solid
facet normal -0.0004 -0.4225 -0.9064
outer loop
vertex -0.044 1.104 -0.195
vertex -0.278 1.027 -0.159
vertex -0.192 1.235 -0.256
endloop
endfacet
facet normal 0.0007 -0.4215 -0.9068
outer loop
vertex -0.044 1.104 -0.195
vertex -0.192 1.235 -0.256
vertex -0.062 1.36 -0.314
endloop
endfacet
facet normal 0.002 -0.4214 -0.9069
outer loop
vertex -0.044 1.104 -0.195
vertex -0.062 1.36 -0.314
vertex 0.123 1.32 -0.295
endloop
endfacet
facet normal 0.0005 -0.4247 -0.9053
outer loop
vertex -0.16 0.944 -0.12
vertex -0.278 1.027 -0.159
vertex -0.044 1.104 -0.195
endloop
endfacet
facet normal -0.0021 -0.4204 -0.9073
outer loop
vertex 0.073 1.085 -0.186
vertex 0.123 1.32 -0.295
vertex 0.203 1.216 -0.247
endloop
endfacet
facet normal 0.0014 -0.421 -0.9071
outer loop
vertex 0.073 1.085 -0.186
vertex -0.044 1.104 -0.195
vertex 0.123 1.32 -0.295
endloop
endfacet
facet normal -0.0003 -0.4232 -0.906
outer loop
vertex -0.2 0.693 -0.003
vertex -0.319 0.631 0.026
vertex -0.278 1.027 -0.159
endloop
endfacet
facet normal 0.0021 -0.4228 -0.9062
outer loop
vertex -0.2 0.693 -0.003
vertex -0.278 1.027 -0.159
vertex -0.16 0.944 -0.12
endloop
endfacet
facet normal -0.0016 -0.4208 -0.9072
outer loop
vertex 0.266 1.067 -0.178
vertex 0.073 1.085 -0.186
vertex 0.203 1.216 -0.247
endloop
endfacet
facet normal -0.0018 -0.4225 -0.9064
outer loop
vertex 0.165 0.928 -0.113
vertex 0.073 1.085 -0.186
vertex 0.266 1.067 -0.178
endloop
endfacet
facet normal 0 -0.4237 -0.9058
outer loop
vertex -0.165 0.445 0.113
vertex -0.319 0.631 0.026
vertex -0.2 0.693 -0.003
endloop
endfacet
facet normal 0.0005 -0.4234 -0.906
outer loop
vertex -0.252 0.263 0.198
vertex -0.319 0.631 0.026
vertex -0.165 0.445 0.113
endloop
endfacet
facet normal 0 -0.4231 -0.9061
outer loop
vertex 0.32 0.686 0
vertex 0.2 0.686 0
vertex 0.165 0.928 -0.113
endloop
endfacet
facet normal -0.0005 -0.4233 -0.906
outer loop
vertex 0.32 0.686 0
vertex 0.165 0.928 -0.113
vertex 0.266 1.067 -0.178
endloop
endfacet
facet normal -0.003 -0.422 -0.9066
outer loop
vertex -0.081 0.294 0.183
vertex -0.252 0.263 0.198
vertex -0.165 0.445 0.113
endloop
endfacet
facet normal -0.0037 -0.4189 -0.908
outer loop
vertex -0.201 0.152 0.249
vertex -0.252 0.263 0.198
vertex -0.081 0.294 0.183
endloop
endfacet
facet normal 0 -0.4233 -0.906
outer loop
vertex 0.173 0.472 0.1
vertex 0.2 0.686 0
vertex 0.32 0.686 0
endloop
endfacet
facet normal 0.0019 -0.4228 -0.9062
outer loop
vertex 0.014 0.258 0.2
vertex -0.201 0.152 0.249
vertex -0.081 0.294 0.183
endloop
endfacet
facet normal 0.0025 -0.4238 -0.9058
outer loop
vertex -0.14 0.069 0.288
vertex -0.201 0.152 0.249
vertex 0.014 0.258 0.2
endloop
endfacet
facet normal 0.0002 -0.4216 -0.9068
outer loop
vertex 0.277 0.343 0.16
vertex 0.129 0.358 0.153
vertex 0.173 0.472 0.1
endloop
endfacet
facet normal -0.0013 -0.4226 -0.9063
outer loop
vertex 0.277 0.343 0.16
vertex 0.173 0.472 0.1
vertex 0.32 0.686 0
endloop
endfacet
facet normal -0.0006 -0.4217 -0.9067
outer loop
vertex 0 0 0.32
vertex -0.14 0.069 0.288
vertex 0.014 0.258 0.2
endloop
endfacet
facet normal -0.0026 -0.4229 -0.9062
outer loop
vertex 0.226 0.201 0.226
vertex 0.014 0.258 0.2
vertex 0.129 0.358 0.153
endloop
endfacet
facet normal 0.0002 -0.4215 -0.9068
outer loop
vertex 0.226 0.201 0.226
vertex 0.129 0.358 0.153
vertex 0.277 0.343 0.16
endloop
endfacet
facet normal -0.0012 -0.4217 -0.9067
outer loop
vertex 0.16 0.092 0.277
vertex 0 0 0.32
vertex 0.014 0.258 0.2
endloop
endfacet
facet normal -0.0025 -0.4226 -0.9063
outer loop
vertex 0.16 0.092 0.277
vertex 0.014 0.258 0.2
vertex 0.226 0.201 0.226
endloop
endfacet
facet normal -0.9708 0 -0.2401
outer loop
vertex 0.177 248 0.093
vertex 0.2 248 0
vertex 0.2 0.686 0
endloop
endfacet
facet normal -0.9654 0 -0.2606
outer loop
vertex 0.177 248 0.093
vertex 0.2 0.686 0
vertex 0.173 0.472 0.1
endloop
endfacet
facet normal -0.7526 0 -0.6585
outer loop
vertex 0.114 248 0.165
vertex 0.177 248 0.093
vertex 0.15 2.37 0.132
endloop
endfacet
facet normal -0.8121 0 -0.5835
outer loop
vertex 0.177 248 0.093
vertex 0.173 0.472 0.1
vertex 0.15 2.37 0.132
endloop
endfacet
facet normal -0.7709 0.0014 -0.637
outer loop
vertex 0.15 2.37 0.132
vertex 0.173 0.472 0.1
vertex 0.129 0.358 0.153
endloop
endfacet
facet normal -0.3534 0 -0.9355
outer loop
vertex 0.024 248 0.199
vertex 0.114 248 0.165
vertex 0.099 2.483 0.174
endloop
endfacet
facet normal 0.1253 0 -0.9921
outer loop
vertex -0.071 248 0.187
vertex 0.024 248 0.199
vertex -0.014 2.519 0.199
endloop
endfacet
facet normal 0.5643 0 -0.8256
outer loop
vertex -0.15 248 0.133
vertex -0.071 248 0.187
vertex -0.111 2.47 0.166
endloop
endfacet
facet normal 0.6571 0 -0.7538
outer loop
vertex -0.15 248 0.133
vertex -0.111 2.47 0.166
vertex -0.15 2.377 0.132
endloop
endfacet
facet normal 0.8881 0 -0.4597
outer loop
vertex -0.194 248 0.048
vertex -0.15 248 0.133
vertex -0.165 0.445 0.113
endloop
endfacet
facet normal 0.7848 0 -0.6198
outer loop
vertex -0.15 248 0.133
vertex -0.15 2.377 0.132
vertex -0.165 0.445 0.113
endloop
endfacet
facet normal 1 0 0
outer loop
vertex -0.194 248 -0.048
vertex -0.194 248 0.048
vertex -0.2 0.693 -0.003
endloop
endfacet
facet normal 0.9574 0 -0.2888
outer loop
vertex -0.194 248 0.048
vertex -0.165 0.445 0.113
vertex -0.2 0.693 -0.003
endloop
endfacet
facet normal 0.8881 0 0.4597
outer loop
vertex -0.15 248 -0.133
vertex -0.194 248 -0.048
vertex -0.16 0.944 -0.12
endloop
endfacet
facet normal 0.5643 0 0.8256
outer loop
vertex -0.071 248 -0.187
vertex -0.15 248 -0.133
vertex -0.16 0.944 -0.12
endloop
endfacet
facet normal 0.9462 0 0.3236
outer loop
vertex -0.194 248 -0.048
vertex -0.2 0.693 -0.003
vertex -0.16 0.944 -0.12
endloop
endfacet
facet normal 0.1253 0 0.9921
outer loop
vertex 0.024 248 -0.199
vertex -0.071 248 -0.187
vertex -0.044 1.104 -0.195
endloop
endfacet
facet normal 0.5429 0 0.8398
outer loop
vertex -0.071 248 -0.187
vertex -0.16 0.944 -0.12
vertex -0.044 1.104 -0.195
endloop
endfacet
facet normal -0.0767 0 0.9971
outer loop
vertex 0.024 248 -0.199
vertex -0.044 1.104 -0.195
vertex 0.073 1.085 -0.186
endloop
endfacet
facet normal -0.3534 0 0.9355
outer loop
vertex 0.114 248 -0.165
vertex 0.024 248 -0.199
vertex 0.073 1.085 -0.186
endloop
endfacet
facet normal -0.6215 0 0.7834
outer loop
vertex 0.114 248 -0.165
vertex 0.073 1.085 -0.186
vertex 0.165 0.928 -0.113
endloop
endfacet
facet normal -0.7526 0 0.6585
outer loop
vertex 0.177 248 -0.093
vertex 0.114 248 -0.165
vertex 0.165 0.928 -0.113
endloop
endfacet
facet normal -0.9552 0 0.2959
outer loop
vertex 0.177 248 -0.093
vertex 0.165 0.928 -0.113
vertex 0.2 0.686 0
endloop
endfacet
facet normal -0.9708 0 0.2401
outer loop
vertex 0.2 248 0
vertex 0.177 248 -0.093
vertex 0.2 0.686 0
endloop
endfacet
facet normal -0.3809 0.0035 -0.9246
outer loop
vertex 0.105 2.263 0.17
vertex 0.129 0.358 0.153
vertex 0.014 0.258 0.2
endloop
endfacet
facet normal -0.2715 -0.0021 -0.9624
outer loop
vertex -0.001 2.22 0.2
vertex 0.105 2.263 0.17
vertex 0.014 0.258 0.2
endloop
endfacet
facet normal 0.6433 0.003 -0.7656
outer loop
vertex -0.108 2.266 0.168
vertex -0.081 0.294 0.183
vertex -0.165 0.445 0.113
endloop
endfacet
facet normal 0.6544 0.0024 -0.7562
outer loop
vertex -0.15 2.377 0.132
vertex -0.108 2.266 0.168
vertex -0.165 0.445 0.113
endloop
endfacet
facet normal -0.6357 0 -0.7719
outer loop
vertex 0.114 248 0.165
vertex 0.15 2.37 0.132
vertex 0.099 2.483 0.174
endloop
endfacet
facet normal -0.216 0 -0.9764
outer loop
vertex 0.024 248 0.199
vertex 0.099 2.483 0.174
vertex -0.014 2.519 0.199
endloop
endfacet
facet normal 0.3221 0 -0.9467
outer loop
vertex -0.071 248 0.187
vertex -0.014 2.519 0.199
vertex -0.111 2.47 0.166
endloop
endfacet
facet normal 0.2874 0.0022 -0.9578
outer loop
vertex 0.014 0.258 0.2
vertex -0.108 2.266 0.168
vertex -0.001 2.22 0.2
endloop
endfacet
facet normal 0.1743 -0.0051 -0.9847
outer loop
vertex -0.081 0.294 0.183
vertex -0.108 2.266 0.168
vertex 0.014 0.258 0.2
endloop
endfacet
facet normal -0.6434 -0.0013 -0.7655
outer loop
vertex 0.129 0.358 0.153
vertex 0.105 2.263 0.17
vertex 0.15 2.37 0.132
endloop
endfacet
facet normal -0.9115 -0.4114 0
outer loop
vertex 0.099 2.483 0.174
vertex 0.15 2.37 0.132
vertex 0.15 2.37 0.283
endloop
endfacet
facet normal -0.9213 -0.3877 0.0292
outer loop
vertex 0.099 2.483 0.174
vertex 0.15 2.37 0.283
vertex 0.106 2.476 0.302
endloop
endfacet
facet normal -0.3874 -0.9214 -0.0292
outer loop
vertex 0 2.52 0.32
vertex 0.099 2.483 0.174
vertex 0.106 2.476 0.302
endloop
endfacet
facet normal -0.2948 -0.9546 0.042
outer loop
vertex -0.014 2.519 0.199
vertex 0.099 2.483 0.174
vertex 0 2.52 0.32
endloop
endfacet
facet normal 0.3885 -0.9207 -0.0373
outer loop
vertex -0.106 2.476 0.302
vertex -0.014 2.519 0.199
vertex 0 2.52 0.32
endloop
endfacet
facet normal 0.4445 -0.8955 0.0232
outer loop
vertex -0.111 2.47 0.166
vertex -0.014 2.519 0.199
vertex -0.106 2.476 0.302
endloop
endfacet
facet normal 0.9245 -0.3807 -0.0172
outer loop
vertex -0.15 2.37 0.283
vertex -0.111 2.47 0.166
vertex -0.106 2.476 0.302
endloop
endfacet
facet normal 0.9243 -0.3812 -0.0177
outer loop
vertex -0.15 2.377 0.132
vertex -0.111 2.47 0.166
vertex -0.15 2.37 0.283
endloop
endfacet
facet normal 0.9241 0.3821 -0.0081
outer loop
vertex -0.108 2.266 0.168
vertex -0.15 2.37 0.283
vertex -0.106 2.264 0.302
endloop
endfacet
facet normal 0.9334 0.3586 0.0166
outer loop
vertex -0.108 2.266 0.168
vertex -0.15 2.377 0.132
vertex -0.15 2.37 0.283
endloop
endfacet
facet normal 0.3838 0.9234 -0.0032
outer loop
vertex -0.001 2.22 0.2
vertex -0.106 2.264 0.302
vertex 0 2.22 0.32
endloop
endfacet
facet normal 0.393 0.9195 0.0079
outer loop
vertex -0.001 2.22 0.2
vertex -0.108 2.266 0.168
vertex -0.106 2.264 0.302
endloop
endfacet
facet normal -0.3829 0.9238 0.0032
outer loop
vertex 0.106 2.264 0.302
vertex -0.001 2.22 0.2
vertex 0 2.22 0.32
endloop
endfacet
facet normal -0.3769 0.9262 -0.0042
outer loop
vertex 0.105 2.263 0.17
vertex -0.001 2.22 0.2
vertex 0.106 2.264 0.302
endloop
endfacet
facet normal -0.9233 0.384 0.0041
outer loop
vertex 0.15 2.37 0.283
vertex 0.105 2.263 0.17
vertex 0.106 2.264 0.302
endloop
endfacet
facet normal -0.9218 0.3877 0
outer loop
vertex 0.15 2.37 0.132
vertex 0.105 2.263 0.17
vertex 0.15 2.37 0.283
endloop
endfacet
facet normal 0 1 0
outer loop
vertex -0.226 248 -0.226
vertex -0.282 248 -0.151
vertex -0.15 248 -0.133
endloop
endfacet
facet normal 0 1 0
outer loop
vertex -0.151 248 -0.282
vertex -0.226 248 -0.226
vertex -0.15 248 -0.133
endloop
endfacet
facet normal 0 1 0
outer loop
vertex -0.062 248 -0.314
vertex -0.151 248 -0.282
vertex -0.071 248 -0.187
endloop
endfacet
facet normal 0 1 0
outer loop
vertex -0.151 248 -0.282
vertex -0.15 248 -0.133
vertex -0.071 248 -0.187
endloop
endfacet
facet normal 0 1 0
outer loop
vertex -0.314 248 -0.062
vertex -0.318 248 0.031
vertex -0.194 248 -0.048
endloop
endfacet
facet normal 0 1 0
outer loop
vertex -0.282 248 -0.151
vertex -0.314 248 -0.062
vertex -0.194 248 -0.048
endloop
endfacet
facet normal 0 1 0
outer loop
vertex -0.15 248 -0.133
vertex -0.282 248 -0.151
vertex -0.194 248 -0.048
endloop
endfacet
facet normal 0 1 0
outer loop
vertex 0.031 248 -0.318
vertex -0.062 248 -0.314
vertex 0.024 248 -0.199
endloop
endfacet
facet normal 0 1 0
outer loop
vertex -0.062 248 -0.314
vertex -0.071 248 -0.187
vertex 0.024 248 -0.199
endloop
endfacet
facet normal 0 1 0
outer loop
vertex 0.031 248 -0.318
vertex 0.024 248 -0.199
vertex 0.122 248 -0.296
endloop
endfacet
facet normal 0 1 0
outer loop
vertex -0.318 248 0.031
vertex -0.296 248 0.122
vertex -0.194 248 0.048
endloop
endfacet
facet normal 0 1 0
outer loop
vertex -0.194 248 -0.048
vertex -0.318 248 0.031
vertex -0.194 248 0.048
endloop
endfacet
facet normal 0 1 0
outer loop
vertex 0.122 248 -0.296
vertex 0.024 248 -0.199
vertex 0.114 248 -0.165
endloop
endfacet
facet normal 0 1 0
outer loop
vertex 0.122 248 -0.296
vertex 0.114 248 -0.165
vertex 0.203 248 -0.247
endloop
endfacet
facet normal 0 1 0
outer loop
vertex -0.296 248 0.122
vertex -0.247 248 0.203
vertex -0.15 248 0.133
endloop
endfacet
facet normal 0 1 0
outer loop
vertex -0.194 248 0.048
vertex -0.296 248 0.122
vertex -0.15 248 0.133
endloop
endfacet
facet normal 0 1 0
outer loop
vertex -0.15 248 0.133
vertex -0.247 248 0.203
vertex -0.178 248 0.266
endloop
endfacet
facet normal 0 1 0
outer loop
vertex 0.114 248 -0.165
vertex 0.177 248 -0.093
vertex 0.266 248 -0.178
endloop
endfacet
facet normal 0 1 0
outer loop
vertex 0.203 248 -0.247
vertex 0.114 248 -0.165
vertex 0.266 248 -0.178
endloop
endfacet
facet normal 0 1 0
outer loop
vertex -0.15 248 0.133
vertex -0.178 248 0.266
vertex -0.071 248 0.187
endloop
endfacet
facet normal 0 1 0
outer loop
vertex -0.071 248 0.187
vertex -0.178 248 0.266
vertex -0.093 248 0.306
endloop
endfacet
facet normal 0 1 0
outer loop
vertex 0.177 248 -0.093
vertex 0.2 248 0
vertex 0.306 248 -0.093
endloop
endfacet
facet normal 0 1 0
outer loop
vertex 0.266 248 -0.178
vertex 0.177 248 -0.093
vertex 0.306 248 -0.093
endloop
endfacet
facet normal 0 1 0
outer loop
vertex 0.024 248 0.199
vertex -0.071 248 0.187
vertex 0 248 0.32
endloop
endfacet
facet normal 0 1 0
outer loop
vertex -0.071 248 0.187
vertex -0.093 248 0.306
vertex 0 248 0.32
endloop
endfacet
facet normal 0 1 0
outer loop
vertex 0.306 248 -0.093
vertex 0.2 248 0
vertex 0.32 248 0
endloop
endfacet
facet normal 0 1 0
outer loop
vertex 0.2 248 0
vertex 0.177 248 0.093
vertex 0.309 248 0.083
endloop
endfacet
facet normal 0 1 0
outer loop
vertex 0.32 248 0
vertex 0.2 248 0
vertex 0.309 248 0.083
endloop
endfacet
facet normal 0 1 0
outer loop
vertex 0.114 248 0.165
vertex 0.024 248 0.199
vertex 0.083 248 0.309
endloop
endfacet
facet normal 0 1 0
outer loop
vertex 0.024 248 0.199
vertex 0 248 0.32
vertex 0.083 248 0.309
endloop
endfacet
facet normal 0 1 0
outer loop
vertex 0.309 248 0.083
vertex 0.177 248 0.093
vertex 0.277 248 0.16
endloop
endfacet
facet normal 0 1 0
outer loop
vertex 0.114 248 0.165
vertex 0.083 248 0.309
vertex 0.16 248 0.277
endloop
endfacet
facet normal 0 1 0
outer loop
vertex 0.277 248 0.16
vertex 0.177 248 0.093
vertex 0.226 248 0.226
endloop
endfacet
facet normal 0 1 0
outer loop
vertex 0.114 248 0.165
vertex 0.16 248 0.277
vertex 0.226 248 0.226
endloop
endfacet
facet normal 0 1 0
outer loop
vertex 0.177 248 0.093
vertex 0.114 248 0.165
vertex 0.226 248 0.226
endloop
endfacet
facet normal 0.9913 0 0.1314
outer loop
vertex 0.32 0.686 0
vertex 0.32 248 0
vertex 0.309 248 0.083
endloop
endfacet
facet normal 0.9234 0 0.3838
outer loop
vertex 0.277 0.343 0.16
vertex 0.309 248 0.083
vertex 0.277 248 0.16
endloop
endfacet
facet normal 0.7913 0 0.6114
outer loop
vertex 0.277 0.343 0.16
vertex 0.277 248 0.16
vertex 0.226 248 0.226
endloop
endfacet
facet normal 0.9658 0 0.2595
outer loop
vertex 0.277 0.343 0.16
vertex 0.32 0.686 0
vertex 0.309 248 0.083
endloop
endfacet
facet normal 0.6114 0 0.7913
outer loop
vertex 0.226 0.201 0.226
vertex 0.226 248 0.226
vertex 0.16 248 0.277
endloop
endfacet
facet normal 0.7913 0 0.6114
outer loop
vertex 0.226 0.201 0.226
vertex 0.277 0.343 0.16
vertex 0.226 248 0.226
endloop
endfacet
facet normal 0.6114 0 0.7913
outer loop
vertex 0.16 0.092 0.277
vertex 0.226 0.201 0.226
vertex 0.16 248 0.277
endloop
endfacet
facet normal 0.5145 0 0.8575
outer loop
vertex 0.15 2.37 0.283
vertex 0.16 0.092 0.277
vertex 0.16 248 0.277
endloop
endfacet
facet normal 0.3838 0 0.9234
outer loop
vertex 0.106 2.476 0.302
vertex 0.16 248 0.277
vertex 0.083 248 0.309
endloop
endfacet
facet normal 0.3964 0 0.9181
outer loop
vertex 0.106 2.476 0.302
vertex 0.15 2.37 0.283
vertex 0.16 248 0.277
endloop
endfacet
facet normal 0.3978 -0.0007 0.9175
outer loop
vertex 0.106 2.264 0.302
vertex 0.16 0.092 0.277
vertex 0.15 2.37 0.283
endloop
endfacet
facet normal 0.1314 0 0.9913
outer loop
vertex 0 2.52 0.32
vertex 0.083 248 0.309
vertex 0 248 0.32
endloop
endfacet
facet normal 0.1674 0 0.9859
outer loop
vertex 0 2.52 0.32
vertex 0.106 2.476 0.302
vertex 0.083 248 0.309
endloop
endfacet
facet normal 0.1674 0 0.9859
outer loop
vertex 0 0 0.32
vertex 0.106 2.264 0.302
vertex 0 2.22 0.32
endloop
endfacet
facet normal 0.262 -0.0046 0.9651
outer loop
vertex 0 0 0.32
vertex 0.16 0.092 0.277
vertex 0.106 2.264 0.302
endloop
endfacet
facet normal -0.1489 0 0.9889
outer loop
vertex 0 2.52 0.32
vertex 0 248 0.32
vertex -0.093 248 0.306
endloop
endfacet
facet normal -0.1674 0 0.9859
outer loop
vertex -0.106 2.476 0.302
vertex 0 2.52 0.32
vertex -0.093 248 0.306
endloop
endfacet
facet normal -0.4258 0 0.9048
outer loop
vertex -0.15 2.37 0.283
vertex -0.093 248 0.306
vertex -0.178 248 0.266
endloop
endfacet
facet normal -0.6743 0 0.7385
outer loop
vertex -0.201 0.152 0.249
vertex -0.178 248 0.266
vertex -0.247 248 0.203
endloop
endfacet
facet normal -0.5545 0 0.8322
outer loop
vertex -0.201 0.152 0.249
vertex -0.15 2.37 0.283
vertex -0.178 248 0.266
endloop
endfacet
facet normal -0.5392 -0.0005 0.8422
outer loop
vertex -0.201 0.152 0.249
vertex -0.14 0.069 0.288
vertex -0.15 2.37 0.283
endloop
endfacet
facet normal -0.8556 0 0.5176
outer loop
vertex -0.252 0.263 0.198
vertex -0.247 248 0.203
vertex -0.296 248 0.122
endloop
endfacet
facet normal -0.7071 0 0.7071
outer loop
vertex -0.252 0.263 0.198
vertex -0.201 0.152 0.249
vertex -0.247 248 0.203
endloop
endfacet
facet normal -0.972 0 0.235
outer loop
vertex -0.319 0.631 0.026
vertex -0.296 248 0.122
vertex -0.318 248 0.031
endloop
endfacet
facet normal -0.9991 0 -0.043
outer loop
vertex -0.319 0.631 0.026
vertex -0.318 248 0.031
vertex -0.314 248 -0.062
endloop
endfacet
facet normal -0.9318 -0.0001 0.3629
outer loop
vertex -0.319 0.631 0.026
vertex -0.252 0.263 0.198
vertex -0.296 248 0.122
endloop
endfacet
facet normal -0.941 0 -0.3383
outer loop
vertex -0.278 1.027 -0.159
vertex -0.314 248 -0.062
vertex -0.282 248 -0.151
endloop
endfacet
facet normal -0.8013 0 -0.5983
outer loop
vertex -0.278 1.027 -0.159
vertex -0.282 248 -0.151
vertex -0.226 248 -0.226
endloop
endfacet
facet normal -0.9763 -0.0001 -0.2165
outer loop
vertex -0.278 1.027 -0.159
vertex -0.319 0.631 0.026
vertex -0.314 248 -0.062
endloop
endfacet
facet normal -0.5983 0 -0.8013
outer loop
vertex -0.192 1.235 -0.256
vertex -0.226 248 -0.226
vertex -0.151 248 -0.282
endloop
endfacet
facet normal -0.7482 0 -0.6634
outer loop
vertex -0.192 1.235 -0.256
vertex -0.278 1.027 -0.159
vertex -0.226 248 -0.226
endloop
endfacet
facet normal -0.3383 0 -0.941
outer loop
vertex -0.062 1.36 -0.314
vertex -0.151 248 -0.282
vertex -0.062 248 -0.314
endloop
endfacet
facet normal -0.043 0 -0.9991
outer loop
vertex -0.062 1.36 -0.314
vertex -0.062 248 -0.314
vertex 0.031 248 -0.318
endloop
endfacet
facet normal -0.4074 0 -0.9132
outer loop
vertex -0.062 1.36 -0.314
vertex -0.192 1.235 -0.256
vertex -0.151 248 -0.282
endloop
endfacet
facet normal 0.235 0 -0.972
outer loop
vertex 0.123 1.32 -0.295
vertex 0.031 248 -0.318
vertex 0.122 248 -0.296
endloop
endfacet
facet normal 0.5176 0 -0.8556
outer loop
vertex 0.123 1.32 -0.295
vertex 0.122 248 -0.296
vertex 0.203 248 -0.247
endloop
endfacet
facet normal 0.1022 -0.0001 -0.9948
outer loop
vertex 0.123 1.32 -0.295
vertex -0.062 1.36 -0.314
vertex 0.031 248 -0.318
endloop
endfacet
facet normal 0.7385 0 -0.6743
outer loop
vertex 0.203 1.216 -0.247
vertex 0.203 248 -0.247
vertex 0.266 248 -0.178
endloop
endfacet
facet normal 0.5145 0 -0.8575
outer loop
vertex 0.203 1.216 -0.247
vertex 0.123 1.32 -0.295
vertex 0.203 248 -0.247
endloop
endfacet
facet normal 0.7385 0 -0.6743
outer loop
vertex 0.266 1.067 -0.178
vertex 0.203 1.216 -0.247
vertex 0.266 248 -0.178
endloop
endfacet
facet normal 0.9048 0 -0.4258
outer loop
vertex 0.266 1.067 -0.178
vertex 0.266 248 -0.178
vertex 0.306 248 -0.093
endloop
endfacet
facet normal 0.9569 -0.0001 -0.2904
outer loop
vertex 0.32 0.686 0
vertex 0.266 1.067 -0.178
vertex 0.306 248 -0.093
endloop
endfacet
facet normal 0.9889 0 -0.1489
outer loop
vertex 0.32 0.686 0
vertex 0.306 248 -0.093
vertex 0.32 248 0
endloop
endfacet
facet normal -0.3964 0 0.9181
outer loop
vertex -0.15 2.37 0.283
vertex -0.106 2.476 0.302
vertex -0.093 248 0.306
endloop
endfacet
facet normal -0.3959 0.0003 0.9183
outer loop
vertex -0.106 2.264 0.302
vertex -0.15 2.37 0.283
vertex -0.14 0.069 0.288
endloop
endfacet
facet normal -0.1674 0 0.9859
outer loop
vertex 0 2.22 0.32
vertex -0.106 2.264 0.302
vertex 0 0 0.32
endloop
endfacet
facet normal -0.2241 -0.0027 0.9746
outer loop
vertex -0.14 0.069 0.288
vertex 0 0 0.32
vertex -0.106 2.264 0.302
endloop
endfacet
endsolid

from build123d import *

# Parameters (mm, degrees)
F0_R     = 0.2
F1_DEPTH = 248
F3_W     = 2.602176
F3_H     = 3.299261
F4_DEPTH = 25
F5_R     = 0.15
F6_DEPTH = 25


with BuildPart() as f1:
    # F0 (on Front) → F1 (new body)
    with BuildSketch(Plane.XZ):
        with BuildLine():
            ThreePointArc((0, 0.32), (-0.226274, -0.226274), (0.32, 0))
            ThreePointArc((0.32, 0), (0.226274, 0.226274), (0, 0.32))
        make_face()
        Circle(F0_R, mode=Mode.SUBTRACT)
    extrude(amount=-F1_DEPTH)

    # F3 (on face) → F4 (cut)
    with BuildSketch(Plane(origin=(0, 0.122567, 0.262846), x_dir=(1, 0, 0), z_dir=(0, -0.422618, -0.906308))):
        with Locations((-0.016375, -0.548971)):
            Rectangle(F3_W, F3_H)
    extrude(amount=F4_DEPTH, mode=Mode.SUBTRACT)

    # F5 (on Top) → F6 (cut)
    with BuildSketch(Plane.XY):
        with Locations((0, 2.37)):
            Circle(F5_R)
    extrude(amount=F6_DEPTH, mode=Mode.SUBTRACT)


solid = f1.part
